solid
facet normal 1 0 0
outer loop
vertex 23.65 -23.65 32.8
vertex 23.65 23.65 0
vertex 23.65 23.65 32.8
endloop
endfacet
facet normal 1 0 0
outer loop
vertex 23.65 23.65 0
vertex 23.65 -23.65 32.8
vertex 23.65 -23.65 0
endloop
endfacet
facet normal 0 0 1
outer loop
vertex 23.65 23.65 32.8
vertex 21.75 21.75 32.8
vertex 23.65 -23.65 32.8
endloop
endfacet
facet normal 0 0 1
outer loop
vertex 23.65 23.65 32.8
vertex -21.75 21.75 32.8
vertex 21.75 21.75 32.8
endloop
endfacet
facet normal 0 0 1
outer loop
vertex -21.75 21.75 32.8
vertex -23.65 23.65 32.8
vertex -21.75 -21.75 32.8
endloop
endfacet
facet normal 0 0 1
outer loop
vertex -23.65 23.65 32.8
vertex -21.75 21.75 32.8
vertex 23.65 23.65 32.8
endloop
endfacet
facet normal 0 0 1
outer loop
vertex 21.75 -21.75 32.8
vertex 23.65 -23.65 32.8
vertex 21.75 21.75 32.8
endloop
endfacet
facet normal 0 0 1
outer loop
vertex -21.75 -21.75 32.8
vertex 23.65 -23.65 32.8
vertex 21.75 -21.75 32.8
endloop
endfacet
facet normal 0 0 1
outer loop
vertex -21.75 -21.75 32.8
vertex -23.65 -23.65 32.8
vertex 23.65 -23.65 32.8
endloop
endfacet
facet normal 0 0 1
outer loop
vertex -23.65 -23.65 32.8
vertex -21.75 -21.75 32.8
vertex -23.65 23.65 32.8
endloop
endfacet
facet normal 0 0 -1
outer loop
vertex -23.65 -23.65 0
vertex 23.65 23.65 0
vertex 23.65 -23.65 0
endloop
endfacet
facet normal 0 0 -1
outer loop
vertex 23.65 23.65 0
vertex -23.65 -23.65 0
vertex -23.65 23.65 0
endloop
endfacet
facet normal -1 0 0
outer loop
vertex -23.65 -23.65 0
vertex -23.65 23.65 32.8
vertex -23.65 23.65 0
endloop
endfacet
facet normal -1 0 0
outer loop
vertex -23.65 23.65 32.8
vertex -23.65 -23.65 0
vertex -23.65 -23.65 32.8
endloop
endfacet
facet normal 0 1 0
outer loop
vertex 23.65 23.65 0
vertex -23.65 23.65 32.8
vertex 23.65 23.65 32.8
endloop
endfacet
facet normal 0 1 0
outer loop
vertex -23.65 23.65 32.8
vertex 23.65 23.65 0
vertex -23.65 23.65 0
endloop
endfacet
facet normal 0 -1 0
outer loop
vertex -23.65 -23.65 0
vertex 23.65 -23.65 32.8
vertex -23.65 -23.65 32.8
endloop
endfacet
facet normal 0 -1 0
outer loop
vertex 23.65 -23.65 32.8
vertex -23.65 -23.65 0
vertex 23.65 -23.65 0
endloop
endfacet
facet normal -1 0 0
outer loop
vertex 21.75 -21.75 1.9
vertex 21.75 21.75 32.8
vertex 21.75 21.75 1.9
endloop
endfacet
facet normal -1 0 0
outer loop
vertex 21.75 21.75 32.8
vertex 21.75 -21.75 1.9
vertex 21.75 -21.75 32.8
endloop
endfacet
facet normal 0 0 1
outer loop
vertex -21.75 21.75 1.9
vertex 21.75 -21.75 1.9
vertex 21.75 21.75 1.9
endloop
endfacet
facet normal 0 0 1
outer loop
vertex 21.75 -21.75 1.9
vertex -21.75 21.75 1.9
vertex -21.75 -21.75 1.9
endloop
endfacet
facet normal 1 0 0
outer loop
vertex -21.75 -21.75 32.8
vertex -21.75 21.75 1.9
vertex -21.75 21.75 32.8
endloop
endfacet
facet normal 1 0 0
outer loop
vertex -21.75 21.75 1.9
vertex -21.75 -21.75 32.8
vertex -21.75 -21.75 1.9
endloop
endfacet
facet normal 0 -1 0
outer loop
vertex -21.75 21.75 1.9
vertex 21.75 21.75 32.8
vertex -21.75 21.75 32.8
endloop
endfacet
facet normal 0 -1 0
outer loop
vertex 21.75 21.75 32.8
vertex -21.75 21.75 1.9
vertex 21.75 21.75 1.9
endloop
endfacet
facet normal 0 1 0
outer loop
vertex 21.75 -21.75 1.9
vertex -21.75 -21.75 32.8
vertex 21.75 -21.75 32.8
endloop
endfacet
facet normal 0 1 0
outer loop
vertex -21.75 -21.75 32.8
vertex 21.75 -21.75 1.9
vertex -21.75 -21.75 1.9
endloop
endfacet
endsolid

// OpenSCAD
// file: ../common.scad
module ccube(dims) {
    translate([-dims[0]/2, -dims[1]/2, 0]) cube(dims);
}
// file: measurements.scad
include <../common.scad>

thickness = 1.9;
finger_d = 22;

module holder(h) {
    // Child 0 is the outer shape
    // Child 1 is the inner shape
    // Child 2 is the end-cap hole shape
    // Bottom end
    difference() {
        linear_extrude(thickness) { children(0); }
        translate([0, 0, -1])
            linear_extrude(thickness+2) { children(2); }
    }
    // Main chamber: h + thickness to leave room for the lid.
    translate([0, 0, thickness])
        difference() {
            linear_extrude(h + thickness) { children(0); }
            translate([0, 0, -1])
                linear_extrude(h + thickness + 2) { children(1); }
        }
}

module lid() {
    // Child 0 is the outer shape
    // Child 1 is the inner shape
    // Child 2 is the end-cap hole shape
    // Bottom end
    difference() {
        linear_extrude(thickness) { children(0); }
        translate([0, 0, -1])
            linear_extrude(thickness+2) { children(2); }
    }
    // Cap plug
    translate([0, 0, thickness])
        difference() {
            linear_extrude(thickness) { children(1); }
            translate([0, 0, -1])
                linear_extrude(thickness+2) { children(2); }
        }
}

//
// Discovery Tiles
//

discovery_w = 24;
discovery_count = 21;

function discovery_corner_r(w) = w * 7 / 24;

module discovery_tile_shape(w) {
    r = discovery_corner_r(w);
    translate([-w/2, -w/2]) {
        translate([w-r, w-r])
            circle(r=r, $fn=64);
        square([w-r, w]);
        square([w, w-r]);
    }
}

//
// Ancients
//

ancient_r = 19.5;
ancient_count = 22;

//
// Monotliths/Orbitals
//

monolith_orbital_d = 25.25;
monolith_orbital_count = 22;

//
// Game Tokens
//

sector_w = 90;
sector_r = sector_w / (2 * cos(30));

cube_w = 8.5;

round_d = 15.5;
round_h = 10.1;

//
// Player Kit
//

pop_cube_count = 34;
influence_d = round_d;
influence_h = 5;
influence_count = 16;

//
// Combat Dice
//

die_w = 14.5;
// main file
include <measurements.scad>

difference() {
    ccube([3*die_w+2*thickness, 3*die_w+2*thickness, 2*die_w+2*thickness]);
    translate([0, 0, thickness]) ccube([3*die_w, 3*die_w, 2*die_w+2*thickness]);
}
